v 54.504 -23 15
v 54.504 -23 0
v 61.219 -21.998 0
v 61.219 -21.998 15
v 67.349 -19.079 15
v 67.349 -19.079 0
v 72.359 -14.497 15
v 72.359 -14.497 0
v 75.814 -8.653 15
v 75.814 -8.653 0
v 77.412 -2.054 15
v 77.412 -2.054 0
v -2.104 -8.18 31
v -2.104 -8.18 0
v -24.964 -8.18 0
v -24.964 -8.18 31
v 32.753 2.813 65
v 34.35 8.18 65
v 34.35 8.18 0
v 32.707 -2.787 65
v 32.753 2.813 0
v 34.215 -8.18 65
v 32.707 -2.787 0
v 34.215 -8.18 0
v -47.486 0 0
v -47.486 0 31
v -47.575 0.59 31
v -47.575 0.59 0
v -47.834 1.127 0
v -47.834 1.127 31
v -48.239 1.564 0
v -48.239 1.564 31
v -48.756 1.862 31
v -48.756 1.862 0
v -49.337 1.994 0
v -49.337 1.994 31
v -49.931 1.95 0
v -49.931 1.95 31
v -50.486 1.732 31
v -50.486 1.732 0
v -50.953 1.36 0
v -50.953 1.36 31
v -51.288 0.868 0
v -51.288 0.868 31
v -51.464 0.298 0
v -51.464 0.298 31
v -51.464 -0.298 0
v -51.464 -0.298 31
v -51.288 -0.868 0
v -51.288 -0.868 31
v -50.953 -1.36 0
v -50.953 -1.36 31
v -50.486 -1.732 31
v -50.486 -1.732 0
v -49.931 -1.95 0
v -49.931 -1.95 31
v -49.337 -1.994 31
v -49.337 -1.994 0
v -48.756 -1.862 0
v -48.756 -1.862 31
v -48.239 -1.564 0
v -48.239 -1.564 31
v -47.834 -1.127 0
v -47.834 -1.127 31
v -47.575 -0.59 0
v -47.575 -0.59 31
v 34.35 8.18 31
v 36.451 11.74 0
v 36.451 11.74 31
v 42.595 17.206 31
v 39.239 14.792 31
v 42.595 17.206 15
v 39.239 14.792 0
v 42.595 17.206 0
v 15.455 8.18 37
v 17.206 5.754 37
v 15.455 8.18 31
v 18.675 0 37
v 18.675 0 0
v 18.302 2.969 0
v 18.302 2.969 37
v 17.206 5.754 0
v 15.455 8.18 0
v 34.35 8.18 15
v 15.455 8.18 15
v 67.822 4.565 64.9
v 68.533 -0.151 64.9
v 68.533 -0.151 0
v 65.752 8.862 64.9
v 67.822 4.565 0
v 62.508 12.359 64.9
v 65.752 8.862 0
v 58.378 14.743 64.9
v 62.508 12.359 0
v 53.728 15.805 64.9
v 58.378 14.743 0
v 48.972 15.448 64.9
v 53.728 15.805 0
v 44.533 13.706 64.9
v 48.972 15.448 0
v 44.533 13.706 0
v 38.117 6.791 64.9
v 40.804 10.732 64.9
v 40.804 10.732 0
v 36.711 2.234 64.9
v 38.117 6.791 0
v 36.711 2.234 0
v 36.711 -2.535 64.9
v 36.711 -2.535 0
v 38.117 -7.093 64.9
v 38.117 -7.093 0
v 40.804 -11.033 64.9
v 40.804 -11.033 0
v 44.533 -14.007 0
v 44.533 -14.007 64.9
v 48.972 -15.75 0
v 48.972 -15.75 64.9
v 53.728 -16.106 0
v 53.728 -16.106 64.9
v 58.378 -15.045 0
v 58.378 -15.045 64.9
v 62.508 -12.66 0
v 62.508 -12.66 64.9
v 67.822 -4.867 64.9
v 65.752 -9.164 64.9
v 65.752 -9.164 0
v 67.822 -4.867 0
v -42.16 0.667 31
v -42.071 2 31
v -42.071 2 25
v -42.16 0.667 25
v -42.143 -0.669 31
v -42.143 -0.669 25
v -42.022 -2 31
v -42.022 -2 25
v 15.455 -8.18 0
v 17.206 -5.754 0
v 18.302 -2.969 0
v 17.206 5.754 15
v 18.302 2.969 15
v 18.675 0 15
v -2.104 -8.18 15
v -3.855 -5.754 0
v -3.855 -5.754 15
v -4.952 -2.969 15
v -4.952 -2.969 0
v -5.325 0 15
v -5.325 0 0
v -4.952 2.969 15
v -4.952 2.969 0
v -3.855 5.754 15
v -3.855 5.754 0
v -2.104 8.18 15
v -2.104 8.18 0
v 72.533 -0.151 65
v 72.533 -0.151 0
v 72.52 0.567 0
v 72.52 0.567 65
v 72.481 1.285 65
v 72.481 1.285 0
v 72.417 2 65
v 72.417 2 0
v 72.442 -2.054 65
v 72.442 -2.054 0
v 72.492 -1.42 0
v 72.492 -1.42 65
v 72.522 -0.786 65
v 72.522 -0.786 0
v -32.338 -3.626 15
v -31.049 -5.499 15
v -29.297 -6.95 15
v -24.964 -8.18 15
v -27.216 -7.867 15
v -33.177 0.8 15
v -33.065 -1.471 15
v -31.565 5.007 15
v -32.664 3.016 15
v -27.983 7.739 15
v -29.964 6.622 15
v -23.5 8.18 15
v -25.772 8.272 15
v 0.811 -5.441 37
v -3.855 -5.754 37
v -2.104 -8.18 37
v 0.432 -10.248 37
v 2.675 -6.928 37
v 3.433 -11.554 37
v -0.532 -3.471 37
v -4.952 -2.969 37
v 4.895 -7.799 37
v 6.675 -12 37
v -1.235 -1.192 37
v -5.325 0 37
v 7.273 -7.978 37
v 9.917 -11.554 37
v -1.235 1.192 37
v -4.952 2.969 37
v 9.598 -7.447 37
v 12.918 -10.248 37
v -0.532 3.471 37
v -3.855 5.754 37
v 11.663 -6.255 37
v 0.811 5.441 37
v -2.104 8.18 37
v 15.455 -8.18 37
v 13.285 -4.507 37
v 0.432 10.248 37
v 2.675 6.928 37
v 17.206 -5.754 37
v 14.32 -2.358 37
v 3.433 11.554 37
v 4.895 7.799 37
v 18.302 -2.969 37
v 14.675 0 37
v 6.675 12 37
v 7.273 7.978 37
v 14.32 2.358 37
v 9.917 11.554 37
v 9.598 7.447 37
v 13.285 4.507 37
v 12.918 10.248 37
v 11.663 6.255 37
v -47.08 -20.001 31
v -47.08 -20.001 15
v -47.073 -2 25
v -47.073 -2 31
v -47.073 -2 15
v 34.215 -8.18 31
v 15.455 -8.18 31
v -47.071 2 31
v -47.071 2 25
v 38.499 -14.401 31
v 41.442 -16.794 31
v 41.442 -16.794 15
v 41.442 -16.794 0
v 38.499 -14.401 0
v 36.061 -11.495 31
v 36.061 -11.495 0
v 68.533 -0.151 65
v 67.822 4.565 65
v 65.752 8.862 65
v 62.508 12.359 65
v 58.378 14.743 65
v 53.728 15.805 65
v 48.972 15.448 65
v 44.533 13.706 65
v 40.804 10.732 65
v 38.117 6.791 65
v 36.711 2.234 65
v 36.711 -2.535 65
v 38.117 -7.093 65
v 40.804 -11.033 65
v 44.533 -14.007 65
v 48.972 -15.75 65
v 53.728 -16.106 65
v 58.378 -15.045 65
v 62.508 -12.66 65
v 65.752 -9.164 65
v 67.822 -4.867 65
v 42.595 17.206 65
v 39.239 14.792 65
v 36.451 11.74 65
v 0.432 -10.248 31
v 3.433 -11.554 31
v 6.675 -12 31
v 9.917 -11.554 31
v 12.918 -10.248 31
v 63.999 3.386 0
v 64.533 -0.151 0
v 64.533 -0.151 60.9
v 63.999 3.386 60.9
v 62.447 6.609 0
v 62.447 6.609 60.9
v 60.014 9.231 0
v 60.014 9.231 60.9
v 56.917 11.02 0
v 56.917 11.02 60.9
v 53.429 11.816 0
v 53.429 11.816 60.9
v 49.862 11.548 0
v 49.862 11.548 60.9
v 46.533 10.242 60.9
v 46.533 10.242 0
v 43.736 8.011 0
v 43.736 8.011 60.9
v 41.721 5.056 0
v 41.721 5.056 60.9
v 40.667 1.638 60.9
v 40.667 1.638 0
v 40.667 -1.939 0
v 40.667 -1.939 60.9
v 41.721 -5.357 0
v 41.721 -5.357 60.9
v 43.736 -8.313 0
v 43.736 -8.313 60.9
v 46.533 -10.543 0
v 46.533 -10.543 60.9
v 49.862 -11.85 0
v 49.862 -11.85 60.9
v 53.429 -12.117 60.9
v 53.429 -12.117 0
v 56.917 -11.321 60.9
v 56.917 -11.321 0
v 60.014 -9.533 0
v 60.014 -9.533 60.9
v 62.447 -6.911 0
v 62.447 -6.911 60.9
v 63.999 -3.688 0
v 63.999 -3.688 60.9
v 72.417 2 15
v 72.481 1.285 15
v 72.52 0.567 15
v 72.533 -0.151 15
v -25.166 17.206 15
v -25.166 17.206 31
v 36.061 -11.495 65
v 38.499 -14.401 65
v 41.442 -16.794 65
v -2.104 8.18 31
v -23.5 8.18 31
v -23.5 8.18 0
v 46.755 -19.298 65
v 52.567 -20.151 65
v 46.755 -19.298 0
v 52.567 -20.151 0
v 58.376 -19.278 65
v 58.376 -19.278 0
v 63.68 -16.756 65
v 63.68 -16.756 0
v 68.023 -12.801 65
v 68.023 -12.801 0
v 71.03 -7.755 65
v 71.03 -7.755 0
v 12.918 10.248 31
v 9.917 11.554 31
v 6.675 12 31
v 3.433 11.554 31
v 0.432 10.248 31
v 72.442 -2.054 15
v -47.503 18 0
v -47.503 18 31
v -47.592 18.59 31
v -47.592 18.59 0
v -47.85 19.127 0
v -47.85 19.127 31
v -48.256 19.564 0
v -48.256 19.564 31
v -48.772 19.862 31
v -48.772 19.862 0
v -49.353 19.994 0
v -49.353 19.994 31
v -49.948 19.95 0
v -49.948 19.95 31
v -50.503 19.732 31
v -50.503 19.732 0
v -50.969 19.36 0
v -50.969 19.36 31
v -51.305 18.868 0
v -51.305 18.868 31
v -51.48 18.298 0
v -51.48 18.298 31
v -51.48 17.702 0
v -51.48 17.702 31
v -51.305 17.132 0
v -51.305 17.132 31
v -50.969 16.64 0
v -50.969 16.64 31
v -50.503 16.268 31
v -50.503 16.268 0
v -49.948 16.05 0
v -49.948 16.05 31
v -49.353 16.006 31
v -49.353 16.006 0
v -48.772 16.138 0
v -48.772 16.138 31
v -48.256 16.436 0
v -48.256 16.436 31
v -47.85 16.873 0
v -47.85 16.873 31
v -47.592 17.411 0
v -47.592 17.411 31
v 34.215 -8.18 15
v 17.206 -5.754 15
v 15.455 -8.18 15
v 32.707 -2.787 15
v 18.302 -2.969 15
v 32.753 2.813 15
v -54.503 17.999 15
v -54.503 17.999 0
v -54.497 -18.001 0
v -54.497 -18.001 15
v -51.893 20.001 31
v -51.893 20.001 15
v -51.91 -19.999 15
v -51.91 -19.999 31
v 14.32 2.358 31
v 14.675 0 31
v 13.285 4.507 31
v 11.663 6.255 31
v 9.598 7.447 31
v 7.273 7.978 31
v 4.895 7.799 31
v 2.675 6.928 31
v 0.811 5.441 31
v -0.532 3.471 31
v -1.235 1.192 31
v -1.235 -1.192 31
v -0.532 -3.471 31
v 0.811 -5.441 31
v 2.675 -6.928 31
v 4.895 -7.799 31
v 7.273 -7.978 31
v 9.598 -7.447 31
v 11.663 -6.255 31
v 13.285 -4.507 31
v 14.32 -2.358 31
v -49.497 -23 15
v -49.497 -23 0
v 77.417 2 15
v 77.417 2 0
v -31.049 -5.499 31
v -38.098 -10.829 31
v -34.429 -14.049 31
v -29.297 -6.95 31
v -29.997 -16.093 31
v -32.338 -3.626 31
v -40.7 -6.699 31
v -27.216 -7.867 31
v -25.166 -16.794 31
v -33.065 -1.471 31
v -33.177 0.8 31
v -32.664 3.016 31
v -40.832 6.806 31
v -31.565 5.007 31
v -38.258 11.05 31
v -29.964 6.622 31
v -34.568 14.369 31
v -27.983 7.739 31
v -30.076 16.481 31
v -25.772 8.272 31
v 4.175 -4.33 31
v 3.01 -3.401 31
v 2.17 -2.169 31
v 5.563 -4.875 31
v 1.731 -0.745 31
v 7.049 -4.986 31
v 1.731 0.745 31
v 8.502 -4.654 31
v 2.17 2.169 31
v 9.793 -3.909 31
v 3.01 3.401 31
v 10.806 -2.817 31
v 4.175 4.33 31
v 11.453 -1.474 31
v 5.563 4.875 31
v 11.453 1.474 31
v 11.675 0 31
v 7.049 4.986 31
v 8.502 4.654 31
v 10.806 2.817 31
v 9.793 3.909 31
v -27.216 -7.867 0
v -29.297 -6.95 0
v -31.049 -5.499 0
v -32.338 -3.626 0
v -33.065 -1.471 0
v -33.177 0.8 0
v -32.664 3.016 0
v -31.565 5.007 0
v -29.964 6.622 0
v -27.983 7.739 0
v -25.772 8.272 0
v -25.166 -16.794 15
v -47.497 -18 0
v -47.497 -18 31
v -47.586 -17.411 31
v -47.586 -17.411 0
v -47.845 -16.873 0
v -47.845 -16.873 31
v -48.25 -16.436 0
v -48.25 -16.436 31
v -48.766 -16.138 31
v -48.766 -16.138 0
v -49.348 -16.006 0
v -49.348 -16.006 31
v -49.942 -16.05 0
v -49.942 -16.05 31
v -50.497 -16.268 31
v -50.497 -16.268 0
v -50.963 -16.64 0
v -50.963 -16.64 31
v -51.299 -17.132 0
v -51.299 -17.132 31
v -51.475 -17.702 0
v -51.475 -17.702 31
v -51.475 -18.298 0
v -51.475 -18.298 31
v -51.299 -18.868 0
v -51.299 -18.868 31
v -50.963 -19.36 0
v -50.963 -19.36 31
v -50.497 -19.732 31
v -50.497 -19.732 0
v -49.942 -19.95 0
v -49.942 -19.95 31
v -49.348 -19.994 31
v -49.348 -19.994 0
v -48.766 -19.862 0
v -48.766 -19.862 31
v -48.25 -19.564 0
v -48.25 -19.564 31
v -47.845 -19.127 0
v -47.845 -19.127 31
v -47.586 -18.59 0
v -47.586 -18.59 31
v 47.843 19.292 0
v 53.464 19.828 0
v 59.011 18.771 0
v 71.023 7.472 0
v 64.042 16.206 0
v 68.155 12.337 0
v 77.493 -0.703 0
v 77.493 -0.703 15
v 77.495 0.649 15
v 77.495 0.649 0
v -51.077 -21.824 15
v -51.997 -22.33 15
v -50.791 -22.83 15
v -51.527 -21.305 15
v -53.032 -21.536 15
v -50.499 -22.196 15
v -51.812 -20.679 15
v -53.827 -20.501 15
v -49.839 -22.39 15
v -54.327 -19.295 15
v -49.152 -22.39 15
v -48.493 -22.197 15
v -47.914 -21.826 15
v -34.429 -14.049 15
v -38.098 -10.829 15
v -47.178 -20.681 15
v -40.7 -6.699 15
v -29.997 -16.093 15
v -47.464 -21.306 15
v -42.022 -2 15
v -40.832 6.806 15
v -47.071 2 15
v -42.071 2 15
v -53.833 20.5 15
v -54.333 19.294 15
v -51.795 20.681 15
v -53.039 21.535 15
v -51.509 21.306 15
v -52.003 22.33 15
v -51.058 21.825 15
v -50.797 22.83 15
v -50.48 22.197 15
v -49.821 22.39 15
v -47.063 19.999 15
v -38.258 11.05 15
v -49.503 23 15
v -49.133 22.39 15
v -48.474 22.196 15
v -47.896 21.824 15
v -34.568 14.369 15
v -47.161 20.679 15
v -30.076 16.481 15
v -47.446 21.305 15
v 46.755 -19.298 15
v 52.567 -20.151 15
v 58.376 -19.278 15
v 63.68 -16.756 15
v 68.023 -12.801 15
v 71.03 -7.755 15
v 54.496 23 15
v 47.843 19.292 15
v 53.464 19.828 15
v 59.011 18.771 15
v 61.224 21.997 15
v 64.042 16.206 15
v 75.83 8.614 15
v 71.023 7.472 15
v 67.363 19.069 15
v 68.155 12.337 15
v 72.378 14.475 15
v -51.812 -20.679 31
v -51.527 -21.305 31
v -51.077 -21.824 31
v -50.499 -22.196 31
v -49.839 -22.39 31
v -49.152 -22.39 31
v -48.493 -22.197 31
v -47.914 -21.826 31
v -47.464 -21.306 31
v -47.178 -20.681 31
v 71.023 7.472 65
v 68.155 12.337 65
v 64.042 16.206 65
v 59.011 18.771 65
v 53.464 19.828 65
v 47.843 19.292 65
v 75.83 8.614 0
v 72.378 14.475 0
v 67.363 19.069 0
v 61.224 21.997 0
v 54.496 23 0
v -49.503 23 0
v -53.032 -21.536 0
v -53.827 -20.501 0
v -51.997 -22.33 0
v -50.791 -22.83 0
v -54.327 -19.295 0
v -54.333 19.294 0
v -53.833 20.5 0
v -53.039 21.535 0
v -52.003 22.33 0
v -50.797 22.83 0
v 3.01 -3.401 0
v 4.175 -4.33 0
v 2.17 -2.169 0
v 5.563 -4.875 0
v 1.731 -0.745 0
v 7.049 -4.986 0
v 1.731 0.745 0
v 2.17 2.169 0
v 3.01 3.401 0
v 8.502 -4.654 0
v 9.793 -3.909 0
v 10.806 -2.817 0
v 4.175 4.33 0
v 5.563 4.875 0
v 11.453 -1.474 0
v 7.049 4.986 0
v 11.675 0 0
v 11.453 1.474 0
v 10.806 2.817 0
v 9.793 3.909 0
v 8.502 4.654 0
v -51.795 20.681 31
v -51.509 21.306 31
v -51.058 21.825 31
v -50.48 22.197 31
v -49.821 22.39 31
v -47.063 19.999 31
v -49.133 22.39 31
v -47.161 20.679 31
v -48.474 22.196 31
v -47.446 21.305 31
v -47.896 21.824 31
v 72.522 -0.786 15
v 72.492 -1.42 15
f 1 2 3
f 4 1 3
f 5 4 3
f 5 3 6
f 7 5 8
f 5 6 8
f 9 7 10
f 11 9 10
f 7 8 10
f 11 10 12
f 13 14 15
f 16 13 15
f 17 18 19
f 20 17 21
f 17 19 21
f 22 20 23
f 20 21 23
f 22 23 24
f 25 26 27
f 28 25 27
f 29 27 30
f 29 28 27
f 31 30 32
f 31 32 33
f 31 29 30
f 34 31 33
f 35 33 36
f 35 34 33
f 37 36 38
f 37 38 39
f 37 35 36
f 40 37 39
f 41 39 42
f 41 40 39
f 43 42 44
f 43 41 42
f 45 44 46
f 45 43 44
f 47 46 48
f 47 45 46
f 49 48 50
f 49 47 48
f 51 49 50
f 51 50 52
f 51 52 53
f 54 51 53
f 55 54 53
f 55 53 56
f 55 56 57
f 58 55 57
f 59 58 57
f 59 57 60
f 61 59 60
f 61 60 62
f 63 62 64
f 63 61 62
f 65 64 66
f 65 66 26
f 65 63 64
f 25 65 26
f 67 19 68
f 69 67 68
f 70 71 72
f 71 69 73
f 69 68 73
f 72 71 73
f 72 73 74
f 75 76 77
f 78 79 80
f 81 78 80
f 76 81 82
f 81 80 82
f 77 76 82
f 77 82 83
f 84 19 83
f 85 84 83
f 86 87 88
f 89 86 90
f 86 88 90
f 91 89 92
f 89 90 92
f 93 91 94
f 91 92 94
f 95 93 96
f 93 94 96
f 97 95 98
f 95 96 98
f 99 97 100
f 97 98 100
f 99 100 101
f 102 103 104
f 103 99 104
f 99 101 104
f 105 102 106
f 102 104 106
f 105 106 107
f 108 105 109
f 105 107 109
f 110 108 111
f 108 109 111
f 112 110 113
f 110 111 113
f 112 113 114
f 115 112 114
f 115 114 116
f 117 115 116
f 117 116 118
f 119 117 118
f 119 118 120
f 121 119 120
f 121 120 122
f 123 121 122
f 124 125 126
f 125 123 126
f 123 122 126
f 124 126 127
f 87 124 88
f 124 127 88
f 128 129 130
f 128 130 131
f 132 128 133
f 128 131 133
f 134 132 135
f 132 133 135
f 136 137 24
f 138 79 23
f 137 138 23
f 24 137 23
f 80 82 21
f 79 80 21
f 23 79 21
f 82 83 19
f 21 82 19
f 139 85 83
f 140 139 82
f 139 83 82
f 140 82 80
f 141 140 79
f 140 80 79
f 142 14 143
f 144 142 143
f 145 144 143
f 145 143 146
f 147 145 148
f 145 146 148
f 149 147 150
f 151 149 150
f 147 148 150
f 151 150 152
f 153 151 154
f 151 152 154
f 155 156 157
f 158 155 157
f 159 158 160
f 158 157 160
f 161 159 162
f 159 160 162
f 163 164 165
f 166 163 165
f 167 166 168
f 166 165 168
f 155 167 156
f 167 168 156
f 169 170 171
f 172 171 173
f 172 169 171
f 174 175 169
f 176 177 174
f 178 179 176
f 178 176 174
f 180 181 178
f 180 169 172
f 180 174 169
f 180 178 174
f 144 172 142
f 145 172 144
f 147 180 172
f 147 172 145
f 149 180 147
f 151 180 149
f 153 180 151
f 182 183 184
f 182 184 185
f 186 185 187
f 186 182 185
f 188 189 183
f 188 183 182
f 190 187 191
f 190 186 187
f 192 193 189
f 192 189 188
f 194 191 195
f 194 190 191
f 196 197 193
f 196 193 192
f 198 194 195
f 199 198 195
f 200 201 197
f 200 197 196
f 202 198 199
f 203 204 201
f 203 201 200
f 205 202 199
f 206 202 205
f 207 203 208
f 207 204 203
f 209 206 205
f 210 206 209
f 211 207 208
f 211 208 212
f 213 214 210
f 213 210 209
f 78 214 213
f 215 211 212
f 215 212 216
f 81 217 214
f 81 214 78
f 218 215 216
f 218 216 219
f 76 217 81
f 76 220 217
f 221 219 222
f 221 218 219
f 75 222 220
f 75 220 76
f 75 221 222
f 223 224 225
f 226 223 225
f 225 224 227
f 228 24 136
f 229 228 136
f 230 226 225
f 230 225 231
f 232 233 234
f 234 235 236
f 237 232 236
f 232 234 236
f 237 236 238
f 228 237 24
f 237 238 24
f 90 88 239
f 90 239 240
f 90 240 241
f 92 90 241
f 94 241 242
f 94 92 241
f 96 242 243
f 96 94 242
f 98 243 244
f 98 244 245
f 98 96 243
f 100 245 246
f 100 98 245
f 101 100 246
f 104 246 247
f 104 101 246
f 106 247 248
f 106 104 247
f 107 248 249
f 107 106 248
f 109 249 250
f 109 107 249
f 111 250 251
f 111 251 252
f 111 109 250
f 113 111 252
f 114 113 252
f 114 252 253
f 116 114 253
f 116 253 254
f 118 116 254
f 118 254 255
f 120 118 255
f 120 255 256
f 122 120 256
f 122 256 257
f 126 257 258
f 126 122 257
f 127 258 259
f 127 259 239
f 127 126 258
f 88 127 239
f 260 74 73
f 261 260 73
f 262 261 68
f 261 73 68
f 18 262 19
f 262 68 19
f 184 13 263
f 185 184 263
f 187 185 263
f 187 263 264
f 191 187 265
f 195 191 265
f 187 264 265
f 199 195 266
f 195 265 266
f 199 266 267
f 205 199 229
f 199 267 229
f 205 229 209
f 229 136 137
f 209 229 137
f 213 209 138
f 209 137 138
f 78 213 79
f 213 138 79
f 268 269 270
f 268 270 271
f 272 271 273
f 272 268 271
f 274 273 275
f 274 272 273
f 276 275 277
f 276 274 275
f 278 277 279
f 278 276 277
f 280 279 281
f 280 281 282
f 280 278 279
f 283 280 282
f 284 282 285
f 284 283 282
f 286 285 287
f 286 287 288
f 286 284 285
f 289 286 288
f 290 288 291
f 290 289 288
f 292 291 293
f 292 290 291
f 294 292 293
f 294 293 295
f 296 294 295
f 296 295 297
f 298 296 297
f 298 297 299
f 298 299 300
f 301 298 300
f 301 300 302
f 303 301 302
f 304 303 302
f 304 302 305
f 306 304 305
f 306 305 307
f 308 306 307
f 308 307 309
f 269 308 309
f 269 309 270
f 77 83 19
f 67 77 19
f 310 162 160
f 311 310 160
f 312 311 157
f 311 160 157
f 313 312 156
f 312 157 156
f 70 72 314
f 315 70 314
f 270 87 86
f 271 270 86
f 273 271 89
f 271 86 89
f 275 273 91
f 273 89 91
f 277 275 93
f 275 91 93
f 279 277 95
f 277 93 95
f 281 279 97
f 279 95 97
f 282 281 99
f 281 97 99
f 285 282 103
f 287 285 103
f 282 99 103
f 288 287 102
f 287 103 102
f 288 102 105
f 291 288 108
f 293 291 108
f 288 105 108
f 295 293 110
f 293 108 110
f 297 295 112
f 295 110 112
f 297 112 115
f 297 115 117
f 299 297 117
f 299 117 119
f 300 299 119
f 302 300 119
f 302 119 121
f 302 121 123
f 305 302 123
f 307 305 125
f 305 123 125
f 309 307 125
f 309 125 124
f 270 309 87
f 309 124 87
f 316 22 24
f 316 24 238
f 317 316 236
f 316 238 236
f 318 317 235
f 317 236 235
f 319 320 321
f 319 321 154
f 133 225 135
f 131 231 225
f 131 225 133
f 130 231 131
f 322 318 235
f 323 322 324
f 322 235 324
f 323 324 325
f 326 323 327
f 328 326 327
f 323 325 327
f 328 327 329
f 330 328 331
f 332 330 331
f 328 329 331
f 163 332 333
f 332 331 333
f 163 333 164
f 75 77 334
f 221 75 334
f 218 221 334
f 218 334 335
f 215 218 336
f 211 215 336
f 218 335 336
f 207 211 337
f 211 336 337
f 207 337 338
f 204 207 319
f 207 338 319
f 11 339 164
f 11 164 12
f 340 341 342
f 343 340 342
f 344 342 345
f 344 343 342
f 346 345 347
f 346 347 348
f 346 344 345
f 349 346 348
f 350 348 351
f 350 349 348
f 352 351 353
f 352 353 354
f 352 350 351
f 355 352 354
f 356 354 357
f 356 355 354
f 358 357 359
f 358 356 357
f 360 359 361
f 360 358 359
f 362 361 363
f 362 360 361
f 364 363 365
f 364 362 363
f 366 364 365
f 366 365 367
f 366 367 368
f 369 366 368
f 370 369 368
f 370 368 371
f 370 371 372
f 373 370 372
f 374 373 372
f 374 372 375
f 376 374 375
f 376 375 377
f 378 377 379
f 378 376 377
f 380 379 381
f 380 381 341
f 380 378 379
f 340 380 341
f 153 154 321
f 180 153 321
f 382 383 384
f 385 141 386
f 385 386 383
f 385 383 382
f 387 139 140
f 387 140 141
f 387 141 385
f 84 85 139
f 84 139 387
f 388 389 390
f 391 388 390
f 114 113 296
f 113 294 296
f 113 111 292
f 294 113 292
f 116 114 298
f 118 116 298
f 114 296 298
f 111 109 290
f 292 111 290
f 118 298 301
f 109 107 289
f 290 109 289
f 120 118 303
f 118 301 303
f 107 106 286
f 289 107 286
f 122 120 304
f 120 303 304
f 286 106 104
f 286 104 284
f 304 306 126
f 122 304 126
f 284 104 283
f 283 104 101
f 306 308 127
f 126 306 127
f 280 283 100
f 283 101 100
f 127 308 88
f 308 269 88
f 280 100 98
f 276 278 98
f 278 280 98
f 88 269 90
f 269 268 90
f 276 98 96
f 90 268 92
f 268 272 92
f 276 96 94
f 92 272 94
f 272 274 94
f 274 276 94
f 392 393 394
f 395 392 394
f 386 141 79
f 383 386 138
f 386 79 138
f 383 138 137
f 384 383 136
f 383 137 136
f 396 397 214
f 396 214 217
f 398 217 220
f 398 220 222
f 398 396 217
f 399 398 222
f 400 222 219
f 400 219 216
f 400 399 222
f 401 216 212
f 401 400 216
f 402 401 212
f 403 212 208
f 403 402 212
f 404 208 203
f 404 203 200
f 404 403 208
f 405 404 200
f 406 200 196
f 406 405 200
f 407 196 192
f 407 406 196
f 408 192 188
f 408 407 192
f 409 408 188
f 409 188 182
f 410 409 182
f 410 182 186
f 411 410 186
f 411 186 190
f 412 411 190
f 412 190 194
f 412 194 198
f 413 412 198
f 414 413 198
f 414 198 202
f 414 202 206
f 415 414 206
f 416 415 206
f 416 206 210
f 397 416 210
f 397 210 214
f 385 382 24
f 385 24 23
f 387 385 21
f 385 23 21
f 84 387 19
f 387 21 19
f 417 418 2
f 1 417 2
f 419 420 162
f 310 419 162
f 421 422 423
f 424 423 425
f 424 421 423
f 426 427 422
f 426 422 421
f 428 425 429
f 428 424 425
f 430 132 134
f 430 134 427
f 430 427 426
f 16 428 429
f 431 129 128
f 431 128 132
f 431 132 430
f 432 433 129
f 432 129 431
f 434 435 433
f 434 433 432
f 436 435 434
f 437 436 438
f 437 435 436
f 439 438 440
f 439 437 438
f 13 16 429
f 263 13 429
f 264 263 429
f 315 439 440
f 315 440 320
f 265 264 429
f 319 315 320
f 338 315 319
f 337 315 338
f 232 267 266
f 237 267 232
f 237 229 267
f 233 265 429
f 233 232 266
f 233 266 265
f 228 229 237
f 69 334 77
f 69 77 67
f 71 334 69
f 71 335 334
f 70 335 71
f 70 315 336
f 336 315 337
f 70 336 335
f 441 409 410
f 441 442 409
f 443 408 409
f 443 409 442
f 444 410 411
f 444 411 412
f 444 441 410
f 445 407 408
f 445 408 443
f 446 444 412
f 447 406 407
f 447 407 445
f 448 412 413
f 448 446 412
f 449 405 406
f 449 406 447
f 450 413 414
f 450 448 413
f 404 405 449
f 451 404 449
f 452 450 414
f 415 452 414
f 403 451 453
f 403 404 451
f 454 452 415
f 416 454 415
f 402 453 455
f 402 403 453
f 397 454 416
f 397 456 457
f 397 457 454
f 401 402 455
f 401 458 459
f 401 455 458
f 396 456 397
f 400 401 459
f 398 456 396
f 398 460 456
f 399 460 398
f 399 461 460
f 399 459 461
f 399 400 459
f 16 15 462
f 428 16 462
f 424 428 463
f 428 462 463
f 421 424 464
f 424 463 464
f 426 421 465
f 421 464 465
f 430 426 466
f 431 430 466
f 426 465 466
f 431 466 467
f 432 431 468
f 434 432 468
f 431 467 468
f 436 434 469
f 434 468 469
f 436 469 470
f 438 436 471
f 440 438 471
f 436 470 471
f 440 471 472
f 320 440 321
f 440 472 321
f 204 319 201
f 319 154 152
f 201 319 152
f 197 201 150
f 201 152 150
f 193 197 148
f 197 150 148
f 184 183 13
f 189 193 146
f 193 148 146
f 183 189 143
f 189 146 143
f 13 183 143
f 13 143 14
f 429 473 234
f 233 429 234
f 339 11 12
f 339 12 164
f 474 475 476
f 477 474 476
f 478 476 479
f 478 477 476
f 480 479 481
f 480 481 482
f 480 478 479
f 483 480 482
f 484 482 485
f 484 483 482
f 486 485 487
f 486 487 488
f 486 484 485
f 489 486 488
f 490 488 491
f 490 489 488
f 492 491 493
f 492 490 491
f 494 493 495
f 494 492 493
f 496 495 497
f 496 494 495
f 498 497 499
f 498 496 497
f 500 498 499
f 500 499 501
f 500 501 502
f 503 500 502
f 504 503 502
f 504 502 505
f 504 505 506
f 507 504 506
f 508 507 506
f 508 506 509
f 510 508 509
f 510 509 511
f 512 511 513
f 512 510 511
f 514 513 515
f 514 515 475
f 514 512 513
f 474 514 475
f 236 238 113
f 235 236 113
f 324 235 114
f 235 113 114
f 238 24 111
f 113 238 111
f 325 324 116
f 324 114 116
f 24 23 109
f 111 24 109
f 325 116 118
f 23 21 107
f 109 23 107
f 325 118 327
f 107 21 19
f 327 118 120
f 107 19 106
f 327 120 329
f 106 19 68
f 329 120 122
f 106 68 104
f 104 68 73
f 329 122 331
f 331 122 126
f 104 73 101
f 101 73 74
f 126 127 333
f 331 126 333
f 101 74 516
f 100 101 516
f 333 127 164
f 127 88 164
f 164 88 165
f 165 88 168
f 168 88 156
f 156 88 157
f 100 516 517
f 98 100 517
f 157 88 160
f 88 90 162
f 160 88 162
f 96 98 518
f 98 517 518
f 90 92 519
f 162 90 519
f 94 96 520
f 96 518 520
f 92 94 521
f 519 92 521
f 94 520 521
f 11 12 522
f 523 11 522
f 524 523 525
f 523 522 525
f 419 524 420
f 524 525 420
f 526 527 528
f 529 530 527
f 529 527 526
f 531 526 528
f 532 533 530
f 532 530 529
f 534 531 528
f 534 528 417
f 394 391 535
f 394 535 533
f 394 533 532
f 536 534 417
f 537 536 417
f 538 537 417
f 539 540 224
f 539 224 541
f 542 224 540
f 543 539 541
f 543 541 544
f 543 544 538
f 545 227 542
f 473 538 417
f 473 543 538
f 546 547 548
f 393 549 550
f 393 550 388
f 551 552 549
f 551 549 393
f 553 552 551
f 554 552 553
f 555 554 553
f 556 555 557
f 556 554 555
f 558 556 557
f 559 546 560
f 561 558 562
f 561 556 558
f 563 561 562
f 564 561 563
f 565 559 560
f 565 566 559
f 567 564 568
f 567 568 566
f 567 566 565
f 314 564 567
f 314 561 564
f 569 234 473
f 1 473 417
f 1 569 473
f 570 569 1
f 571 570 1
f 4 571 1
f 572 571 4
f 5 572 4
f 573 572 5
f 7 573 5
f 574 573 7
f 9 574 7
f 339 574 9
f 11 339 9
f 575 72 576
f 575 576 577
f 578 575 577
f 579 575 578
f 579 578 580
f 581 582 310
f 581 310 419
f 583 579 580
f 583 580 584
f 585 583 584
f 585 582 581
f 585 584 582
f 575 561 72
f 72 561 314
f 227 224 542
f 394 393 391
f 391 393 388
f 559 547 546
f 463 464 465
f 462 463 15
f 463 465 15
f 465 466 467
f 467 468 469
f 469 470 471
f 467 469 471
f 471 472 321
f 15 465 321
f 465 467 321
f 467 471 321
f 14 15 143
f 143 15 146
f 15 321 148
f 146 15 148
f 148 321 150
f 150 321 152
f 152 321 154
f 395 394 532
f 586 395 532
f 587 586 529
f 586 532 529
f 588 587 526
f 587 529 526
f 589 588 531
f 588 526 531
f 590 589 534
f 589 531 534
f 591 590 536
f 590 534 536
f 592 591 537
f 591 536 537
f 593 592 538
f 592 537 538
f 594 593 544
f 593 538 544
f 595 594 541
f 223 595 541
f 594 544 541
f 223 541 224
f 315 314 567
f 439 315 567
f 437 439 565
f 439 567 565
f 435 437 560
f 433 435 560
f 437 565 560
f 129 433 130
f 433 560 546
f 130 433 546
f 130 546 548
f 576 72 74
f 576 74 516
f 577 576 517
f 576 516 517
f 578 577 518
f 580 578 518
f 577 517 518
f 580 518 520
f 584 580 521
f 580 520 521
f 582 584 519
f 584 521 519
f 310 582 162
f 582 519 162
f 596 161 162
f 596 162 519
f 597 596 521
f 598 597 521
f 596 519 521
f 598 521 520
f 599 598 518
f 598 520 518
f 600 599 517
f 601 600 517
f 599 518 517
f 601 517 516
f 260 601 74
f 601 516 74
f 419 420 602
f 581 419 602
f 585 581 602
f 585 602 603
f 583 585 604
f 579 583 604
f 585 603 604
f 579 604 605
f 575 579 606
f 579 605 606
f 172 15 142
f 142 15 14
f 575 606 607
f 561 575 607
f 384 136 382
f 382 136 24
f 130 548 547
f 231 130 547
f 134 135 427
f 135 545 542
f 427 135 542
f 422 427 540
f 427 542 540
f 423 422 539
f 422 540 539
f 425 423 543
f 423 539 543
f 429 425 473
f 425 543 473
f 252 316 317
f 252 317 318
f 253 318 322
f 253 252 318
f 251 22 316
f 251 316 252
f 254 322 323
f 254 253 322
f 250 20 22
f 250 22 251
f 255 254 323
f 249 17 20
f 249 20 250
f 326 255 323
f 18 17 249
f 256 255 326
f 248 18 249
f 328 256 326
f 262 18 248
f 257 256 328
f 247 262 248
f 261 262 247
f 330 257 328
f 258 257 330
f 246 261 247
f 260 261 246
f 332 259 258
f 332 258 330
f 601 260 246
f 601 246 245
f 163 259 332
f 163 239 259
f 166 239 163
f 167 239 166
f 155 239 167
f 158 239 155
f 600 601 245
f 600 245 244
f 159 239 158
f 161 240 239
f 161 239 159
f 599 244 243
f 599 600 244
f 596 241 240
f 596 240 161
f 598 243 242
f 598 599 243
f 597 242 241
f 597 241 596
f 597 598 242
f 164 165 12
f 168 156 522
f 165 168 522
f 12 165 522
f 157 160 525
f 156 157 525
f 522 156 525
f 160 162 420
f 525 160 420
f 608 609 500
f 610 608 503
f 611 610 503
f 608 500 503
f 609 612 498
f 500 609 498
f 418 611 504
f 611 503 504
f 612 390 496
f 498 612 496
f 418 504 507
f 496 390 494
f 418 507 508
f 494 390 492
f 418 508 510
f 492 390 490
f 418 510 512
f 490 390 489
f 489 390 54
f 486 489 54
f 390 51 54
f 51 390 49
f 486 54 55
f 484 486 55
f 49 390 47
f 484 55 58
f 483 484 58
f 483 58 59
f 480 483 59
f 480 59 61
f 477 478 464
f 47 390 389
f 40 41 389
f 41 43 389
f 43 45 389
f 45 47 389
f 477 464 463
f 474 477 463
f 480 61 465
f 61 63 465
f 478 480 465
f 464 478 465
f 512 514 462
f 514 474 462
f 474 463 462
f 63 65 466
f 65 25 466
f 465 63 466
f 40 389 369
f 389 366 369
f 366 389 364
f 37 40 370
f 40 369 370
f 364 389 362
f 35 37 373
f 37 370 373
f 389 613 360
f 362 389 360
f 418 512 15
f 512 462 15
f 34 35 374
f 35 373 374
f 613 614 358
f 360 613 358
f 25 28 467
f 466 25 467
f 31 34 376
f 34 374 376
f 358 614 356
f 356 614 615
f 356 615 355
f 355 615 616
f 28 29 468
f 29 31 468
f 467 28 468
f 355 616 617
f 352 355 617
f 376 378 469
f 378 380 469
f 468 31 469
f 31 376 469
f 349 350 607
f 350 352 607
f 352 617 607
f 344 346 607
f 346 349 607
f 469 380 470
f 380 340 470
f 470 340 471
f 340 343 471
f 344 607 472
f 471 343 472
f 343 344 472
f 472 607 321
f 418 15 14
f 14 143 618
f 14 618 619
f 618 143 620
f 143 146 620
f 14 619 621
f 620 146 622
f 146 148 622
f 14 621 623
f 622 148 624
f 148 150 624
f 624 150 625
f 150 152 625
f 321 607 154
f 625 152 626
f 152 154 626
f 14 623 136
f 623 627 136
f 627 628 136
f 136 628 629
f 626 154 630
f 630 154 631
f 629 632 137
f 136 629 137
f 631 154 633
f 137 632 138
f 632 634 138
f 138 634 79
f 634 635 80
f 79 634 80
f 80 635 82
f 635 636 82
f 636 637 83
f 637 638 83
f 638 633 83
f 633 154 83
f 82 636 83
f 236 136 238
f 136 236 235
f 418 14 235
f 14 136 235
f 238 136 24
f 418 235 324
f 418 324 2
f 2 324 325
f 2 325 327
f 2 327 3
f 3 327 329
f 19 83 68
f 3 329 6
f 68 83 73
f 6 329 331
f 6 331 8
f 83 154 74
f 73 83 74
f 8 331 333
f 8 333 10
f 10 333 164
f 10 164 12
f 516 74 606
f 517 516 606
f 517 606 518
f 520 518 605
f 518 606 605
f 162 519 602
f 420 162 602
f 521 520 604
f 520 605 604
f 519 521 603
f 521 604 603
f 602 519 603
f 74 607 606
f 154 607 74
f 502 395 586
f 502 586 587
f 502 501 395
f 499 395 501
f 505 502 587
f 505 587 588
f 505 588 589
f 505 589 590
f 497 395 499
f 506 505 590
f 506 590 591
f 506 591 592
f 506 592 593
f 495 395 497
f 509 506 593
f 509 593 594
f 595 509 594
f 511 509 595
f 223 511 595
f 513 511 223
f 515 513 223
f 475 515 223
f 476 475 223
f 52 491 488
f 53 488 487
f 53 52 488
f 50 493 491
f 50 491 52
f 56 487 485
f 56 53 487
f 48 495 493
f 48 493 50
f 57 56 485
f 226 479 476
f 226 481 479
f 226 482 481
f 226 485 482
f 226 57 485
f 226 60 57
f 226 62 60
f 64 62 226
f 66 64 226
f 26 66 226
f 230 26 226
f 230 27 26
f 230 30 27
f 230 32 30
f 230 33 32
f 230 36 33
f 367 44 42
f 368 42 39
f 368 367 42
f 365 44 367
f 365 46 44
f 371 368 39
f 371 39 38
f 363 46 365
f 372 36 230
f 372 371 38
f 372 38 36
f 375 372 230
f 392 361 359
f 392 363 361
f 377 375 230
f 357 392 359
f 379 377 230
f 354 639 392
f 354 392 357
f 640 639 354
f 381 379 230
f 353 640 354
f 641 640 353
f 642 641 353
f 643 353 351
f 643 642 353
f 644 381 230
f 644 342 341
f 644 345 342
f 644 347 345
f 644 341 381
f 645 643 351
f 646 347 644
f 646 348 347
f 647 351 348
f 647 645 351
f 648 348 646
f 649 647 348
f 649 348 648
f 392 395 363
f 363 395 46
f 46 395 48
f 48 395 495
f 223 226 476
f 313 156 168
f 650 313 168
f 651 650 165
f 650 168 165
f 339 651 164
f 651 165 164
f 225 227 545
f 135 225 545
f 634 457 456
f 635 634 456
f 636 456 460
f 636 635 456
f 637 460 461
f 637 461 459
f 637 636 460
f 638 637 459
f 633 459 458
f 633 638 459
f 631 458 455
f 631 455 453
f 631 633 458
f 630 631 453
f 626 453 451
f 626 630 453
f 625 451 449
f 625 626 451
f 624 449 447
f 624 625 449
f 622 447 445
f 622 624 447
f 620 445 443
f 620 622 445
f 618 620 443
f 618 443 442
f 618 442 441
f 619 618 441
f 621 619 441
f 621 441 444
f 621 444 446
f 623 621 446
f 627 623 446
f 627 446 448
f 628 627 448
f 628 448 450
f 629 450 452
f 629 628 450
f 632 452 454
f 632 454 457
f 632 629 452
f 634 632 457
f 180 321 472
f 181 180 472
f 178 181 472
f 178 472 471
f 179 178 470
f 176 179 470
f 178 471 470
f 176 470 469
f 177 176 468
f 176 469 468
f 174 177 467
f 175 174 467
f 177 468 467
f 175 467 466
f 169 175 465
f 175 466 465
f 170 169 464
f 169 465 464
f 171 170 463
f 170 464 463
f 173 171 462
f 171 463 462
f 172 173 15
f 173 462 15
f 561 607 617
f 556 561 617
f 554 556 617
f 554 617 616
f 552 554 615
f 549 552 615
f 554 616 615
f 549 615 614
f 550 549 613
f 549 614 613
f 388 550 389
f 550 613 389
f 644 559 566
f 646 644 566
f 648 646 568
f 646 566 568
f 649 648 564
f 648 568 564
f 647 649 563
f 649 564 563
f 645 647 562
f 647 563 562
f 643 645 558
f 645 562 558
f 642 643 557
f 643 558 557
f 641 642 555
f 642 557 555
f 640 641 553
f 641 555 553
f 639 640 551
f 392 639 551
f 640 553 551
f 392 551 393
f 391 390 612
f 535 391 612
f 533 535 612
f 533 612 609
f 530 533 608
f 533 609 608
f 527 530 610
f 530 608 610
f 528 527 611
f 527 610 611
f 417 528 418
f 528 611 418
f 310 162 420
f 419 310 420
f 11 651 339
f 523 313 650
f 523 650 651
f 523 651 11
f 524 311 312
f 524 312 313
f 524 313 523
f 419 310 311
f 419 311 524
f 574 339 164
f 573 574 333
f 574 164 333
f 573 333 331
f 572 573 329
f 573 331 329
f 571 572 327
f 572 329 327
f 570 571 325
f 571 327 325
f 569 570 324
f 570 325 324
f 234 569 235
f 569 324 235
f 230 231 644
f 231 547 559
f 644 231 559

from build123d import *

# Parameters (mm, degrees)
F1_DEPTH  = 15
F0_R      = 2
F2_DEPTH  = 31
F3_DEPTH  = 25
F4_DEPTH  = 31
F0_R_2    = 8
F5_DEPTH  = 37
F0_R_3    = 5
F6_DEPTH  = 31
F0_R_4    = 16
F0_R_5    = 12
F7_DEPTH  = 65
F8_DEPTH  = 65
F10_DEPTH = 15
F11_DEPTH = 15


# Not quite as in the source:
# - a fillet or chamfer that OpenCascade refuses, or shapes differently, is made with other operations: its cross-section is extruded or revolved along the edge and cut away or added
# - a feature names something its author has since deleted; it is built from what else it names


with BuildPart() as f1:
    # F0 (on Top) → F1 (new body)
    with BuildSketch(Plane.XY):
        with BuildLine():
            ThreePointArc((77.4165694517, 2), (70.0412743977, 16.9583212199), (54.4963863199, 23.0000763868))
            Line((54.4963863199, 23.0000763868), (-49.5028280384, 23.0000763868))
            ThreePointArc((-49.5028280384, 23.0000763868), (-53.0386396779, 21.5353325374), (-54.5028279767, 17.9992908068))
            Line((-54.5028279767, 17.9992908068), (-54.4971717765, -18.0008619668))
            ThreePointArc((-54.4971717765, -18.0008619668), (-53.0324279887, -21.5358880263), (-49.4971718382, -23.0000763868))
            Line((-49.4971718382, -23.0000763868), (54.5036136801, -23.0000763868))
            ThreePointArc((54.5036136801, -23.0000763868), (70.024037462, -16.9740969207), (77.4118141054, -2.0537504379))
            Line((77.4118141054, -2.0537504379), (72.4417991653, -2.0537504379))
            ThreePointArc((72.4417991653, -2.0537504379), (61.1210212719, -18.2127692775), (41.4420685321, -16.7940652806))
            Line((41.4420685321, -16.7940652806), (-25.1657858694, -16.7940652806))
            ThreePointArc((-25.1657858694, -16.7940652806), (-36.3795967687, -12.5710150384), (-42.0220562758, -2))
            Line((-42.0220562758, -2), (-47.0725483227, -2))
            Line((-47.0725483227, -2), (-47.0801730056, -20.0009441468))
            ThreePointArc((-47.0801730056, -20.0009441468), (-49.4958146373, -22.4147707226), (-51.9095643269, -19.999052265))
            Line((-51.9095643269, -19.999052265), (-51.8926214772, 20.0009441468))
            ThreePointArc((-51.8926214772, 20.0009441468), (-49.4769799058, 22.4146170129), (-47.0632301559, 19.999052265))
            Line((-47.0632301559, 19.999052265), (-47.0708540375, 2))
            Line((-47.0708540375, 2), (-42.0708540375, 2))
            ThreePointArc((-42.0708540375, 2), (-36.5346224464, 12.8451417707), (-25.1657858694, 17.2059347194))
            Line((-25.1657858694, 17.2059347194), (42.5953938554, 17.2059347194))
            ThreePointArc((42.5953938554, 17.2059347194), (61.6177075826, 17.6666940031), (72.4165694517, 2))
            Line((72.4165694517, 2), (77.4165694517, 2))
        make_face()
    extrude(amount=F1_DEPTH)

    # F0 (on Top) → F2 (join)
    with BuildSketch(Plane.XY):
        with BuildLine():
            Line((-47.0725483227, -2), (-47.0708540375, 2))
            Line((-47.0708540375, 2), (-47.0632301559, 19.999052265))
            ThreePointArc((-47.0632301559, 19.999052265), (-49.4769799058, 22.4146170129), (-51.8926214772, 20.0009441468))
            Line((-51.8926214772, 20.0009441468), (-51.9095643269, -19.999052265))
            ThreePointArc((-51.9095643269, -19.999052265), (-49.4958146373, -22.4147707226), (-47.0801730056, -20.0009441468))
            Line((-47.0801730056, -20.0009441468), (-47.0725483227, -2))
        make_face()
        with Locations((-49.4971718382, -18.0000763868)):
            Circle(F0_R, mode=Mode.SUBTRACT)
        with Locations((-49.4863972414, 0)):
            Circle(F0_R, mode=Mode.SUBTRACT)
        with Locations((-49.5028280384, 18.0000763868)):
            Circle(F0_R, mode=Mode.SUBTRACT)
    extrude(amount=F2_DEPTH)

    # F0 (on Top) → F3 (join)
    with BuildSketch(Plane.XY):
        with BuildLine():
            ThreePointArc((-42.0220562758, -2), (-42.1645209866, -0.0014403371), (-42.0708540375, 2))
            Line((-42.0708540375, 2), (-47.0708540375, 2))
            Line((-47.0708540375, 2), (-47.0725483227, -2))
            Line((-47.0725483227, -2), (-42.0220562758, -2))
        make_face()
    extrude(amount=F3_DEPTH)

    # F0 (on Top) → F4 (join)
    with BuildSketch(Plane.XY):
        with BuildLine():
            ThreePointArc((34.3503431001, 8.1804120839), (37.766383698, 13.3385657076), (42.5953938554, 17.2059347194))
            Line((42.5953938554, 17.2059347194), (-25.1657858694, 17.2059347194))
            ThreePointArc((-25.1657858694, 17.2059347194), (-36.5346224464, 12.8451417707), (-42.0708540375, 2))
            ThreePointArc((-42.0708540375, 2), (-42.1645209866, -0.0014403371), (-42.0220562758, -2))
            ThreePointArc((-42.0220562758, -2), (-36.3795967687, -12.5710150384), (-25.1657858694, -16.7940652806))
            Line((-25.1657858694, -16.7940652806), (41.4420685321, -16.7940652806))
            ThreePointArc((41.4420685321, -16.7940652806), (37.2108856838, -13.0055426049), (34.2152341998, -8.1804120839))
            Line((34.2152341998, -8.1804120839), (15.4548283117, -8.1804120839))
            ThreePointArc((15.4548283117, -8.1804120839), (6.6752578132, -12), (-2.1043126853, -8.1804120839))
            Line((-2.1043126853, -8.1804120839), (-24.9639281544, -8.1804120839))
            ThreePointArc((-24.9639281544, -8.1804120839), (-33.1770221677, 0.8003828075), (-23.5, 8.1804120839))
            Line((-23.5, 8.1804120839), (-2.1043126853, 8.1804120839))
            ThreePointArc((-2.1043126853, 8.1804120839), (6.6752578132, 12), (15.4548283117, 8.1804120839))
            Line((15.4548283117, 8.1804120839), (34.3503431001, 8.1804120839))
        make_face()
    extrude(amount=F4_DEPTH)

    # F0 (on Top) → F5 (join)
    with BuildSketch(Plane.XY):
        with BuildLine():
            ThreePointArc((18.6752578132, 0), (17.8411622992, 4.3957453303), (15.4548283117, 8.1804120839))
            ThreePointArc((15.4548283117, 8.1804120839), (6.6752578132, 12), (-2.1043126853, 8.1804120839))
            ThreePointArc((-2.1043126853, 8.1804120839), (-5.3247421868, 0), (-2.1043126853, -8.1804120839))
            ThreePointArc((-2.1043126853, -8.1804120839), (6.6752578132, -12), (15.4548283117, -8.1804120839))
            ThreePointArc((15.4548283117, -8.1804120839), (17.8411622992, -4.3957453303), (18.6752578132, 0))
        make_face()
        with Locations((6.6752578132, 0)):
            Circle(F0_R_2, mode=Mode.SUBTRACT)
    extrude(amount=F5_DEPTH)

    # F0 (on Top) → F6 (join)
    with BuildSketch(Plane.XY):
        with Locations((6.6752578132, 0)):
            Circle(F0_R_2)
        with Locations((6.6752578132, 0)):
            Circle(F0_R_3, mode=Mode.SUBTRACT)
    extrude(amount=F6_DEPTH)


with BuildPart() as f7:
    # F0 (on Top) → F7 (new body)
    with BuildSketch(Plane.XY):
        with Locations((52.5325443108, -0.1507078368)):
            Circle(F0_R_4)
        with Locations((52.5325443108, -0.1507078368)):
            Circle(F0_R_5, mode=Mode.SUBTRACT)
    extrude(amount=F7_DEPTH)

    # F9: chamfer of 4.1 on 1 edges, made by hand

    # F9_s1 → F9_t2 (revolve, cut)
    with BuildSketch(Plane.XZ.offset(0.1507078368)):
        Polygon((64.5325443108, 60.9), (68.6325443108, 65), (64.5325443108, 65), align=None)
    revolve(axis=Axis((52.5325443108, -0.1507078368, 65), (0, 0, 1)), mode=Mode.SUBTRACT)


with BuildPart() as f8:
    # F0 (on Top) → F8 (new body)
    with BuildSketch(Plane.XY):
        with BuildLine():
            ThreePointArc((72.5325443108, -0.1507078368), (72.5035295496, 0.926208405), (72.4165694517, 2))
            ThreePointArc((72.4165694517, 2), (61.6177075826, 17.6666940031), (42.5953938554, 17.2059347194))
            ThreePointArc((42.5953938554, 17.2059347194), (37.766383698, 13.3385657076), (34.3503431001, 8.1804120839))
            ThreePointArc((34.3503431001, 8.1804120839), (32.5332262339, 0.0144480163), (34.2152341998, -8.1804120839))
            ThreePointArc((34.2152341998, -8.1804120839), (37.2108856838, -13.0055426049), (41.4420685321, -16.7940652806))
            ThreePointArc((41.4420685321, -16.7940652806), (61.1210212719, -18.2127692775), (72.4417991653, -2.0537504379))
            ThreePointArc((72.4417991653, -2.0537504379), (72.5098451431, -1.1033103015), (72.5325443108, -0.1507078368))
        make_face()
        with Locations((52.5325443108, -0.1507078368)):
            Circle(F0_R_4, mode=Mode.SUBTRACT)
    extrude(amount=F8_DEPTH)


with BuildPart() as f10:
    # F0 (on Top) → F10 (new body)
    with BuildSketch(Plane.XY):
        with BuildLine():
            ThreePointArc((-2.1043126853, -8.1804120839), (-5.3247421868, 0), (-2.1043126853, 8.1804120839))
            Line((-2.1043126853, 8.1804120839), (-23.5, 8.1804120839))
            ThreePointArc((-23.5, 8.1804120839), (-33.1770221677, 0.8003828075), (-24.9639281544, -8.1804120839))
            Line((-24.9639281544, -8.1804120839), (-2.1043126853, -8.1804120839))
        make_face()
    extrude(amount=F10_DEPTH)


with BuildPart() as f10b:
    # F0 (on Top) → F10, piece 2 (new body)
    with BuildSketch(Plane.XY):
        with BuildLine():
            ThreePointArc((34.2152341998, -8.1804120839), (32.5332262339, 0.0144480163), (34.3503431001, 8.1804120839))
            Line((34.3503431001, 8.1804120839), (15.4548283117, 8.1804120839))
            ThreePointArc((15.4548283117, 8.1804120839), (17.8411622992, 4.3957453303), (18.6752578132, 0))
            ThreePointArc((18.6752578132, 0), (17.8411622992, -4.3957453303), (15.4548283117, -8.1804120839))
            Line((15.4548283117, -8.1804120839), (34.2152341998, -8.1804120839))
        make_face()
    extrude(amount=F10_DEPTH)


with BuildPart() as f11:
    # F0 (on Top) → F11 (new body)
    with BuildSketch(Plane.XY):
        with BuildLine():
            ThreePointArc((77.4118141054, -2.0537504379), (77.5036748095, -0.0269801891), (77.4165694517, 2))
            Line((77.4165694517, 2), (72.4165694517, 2))
            ThreePointArc((72.4165694517, 2), (72.5035295496, 0.926208405), (72.5325443108, -0.1507078368))
            ThreePointArc((72.5325443108, -0.1507078368), (72.5098451431, -1.1033103015), (72.4417991653, -2.0537504379))
            Line((72.4417991653, -2.0537504379), (77.4118141054, -2.0537504379))
        make_face()
    extrude(amount=F11_DEPTH)


solid = Compound([f1.part, f7.part, f8.part, f10.part, f10b.part, f11.part])
